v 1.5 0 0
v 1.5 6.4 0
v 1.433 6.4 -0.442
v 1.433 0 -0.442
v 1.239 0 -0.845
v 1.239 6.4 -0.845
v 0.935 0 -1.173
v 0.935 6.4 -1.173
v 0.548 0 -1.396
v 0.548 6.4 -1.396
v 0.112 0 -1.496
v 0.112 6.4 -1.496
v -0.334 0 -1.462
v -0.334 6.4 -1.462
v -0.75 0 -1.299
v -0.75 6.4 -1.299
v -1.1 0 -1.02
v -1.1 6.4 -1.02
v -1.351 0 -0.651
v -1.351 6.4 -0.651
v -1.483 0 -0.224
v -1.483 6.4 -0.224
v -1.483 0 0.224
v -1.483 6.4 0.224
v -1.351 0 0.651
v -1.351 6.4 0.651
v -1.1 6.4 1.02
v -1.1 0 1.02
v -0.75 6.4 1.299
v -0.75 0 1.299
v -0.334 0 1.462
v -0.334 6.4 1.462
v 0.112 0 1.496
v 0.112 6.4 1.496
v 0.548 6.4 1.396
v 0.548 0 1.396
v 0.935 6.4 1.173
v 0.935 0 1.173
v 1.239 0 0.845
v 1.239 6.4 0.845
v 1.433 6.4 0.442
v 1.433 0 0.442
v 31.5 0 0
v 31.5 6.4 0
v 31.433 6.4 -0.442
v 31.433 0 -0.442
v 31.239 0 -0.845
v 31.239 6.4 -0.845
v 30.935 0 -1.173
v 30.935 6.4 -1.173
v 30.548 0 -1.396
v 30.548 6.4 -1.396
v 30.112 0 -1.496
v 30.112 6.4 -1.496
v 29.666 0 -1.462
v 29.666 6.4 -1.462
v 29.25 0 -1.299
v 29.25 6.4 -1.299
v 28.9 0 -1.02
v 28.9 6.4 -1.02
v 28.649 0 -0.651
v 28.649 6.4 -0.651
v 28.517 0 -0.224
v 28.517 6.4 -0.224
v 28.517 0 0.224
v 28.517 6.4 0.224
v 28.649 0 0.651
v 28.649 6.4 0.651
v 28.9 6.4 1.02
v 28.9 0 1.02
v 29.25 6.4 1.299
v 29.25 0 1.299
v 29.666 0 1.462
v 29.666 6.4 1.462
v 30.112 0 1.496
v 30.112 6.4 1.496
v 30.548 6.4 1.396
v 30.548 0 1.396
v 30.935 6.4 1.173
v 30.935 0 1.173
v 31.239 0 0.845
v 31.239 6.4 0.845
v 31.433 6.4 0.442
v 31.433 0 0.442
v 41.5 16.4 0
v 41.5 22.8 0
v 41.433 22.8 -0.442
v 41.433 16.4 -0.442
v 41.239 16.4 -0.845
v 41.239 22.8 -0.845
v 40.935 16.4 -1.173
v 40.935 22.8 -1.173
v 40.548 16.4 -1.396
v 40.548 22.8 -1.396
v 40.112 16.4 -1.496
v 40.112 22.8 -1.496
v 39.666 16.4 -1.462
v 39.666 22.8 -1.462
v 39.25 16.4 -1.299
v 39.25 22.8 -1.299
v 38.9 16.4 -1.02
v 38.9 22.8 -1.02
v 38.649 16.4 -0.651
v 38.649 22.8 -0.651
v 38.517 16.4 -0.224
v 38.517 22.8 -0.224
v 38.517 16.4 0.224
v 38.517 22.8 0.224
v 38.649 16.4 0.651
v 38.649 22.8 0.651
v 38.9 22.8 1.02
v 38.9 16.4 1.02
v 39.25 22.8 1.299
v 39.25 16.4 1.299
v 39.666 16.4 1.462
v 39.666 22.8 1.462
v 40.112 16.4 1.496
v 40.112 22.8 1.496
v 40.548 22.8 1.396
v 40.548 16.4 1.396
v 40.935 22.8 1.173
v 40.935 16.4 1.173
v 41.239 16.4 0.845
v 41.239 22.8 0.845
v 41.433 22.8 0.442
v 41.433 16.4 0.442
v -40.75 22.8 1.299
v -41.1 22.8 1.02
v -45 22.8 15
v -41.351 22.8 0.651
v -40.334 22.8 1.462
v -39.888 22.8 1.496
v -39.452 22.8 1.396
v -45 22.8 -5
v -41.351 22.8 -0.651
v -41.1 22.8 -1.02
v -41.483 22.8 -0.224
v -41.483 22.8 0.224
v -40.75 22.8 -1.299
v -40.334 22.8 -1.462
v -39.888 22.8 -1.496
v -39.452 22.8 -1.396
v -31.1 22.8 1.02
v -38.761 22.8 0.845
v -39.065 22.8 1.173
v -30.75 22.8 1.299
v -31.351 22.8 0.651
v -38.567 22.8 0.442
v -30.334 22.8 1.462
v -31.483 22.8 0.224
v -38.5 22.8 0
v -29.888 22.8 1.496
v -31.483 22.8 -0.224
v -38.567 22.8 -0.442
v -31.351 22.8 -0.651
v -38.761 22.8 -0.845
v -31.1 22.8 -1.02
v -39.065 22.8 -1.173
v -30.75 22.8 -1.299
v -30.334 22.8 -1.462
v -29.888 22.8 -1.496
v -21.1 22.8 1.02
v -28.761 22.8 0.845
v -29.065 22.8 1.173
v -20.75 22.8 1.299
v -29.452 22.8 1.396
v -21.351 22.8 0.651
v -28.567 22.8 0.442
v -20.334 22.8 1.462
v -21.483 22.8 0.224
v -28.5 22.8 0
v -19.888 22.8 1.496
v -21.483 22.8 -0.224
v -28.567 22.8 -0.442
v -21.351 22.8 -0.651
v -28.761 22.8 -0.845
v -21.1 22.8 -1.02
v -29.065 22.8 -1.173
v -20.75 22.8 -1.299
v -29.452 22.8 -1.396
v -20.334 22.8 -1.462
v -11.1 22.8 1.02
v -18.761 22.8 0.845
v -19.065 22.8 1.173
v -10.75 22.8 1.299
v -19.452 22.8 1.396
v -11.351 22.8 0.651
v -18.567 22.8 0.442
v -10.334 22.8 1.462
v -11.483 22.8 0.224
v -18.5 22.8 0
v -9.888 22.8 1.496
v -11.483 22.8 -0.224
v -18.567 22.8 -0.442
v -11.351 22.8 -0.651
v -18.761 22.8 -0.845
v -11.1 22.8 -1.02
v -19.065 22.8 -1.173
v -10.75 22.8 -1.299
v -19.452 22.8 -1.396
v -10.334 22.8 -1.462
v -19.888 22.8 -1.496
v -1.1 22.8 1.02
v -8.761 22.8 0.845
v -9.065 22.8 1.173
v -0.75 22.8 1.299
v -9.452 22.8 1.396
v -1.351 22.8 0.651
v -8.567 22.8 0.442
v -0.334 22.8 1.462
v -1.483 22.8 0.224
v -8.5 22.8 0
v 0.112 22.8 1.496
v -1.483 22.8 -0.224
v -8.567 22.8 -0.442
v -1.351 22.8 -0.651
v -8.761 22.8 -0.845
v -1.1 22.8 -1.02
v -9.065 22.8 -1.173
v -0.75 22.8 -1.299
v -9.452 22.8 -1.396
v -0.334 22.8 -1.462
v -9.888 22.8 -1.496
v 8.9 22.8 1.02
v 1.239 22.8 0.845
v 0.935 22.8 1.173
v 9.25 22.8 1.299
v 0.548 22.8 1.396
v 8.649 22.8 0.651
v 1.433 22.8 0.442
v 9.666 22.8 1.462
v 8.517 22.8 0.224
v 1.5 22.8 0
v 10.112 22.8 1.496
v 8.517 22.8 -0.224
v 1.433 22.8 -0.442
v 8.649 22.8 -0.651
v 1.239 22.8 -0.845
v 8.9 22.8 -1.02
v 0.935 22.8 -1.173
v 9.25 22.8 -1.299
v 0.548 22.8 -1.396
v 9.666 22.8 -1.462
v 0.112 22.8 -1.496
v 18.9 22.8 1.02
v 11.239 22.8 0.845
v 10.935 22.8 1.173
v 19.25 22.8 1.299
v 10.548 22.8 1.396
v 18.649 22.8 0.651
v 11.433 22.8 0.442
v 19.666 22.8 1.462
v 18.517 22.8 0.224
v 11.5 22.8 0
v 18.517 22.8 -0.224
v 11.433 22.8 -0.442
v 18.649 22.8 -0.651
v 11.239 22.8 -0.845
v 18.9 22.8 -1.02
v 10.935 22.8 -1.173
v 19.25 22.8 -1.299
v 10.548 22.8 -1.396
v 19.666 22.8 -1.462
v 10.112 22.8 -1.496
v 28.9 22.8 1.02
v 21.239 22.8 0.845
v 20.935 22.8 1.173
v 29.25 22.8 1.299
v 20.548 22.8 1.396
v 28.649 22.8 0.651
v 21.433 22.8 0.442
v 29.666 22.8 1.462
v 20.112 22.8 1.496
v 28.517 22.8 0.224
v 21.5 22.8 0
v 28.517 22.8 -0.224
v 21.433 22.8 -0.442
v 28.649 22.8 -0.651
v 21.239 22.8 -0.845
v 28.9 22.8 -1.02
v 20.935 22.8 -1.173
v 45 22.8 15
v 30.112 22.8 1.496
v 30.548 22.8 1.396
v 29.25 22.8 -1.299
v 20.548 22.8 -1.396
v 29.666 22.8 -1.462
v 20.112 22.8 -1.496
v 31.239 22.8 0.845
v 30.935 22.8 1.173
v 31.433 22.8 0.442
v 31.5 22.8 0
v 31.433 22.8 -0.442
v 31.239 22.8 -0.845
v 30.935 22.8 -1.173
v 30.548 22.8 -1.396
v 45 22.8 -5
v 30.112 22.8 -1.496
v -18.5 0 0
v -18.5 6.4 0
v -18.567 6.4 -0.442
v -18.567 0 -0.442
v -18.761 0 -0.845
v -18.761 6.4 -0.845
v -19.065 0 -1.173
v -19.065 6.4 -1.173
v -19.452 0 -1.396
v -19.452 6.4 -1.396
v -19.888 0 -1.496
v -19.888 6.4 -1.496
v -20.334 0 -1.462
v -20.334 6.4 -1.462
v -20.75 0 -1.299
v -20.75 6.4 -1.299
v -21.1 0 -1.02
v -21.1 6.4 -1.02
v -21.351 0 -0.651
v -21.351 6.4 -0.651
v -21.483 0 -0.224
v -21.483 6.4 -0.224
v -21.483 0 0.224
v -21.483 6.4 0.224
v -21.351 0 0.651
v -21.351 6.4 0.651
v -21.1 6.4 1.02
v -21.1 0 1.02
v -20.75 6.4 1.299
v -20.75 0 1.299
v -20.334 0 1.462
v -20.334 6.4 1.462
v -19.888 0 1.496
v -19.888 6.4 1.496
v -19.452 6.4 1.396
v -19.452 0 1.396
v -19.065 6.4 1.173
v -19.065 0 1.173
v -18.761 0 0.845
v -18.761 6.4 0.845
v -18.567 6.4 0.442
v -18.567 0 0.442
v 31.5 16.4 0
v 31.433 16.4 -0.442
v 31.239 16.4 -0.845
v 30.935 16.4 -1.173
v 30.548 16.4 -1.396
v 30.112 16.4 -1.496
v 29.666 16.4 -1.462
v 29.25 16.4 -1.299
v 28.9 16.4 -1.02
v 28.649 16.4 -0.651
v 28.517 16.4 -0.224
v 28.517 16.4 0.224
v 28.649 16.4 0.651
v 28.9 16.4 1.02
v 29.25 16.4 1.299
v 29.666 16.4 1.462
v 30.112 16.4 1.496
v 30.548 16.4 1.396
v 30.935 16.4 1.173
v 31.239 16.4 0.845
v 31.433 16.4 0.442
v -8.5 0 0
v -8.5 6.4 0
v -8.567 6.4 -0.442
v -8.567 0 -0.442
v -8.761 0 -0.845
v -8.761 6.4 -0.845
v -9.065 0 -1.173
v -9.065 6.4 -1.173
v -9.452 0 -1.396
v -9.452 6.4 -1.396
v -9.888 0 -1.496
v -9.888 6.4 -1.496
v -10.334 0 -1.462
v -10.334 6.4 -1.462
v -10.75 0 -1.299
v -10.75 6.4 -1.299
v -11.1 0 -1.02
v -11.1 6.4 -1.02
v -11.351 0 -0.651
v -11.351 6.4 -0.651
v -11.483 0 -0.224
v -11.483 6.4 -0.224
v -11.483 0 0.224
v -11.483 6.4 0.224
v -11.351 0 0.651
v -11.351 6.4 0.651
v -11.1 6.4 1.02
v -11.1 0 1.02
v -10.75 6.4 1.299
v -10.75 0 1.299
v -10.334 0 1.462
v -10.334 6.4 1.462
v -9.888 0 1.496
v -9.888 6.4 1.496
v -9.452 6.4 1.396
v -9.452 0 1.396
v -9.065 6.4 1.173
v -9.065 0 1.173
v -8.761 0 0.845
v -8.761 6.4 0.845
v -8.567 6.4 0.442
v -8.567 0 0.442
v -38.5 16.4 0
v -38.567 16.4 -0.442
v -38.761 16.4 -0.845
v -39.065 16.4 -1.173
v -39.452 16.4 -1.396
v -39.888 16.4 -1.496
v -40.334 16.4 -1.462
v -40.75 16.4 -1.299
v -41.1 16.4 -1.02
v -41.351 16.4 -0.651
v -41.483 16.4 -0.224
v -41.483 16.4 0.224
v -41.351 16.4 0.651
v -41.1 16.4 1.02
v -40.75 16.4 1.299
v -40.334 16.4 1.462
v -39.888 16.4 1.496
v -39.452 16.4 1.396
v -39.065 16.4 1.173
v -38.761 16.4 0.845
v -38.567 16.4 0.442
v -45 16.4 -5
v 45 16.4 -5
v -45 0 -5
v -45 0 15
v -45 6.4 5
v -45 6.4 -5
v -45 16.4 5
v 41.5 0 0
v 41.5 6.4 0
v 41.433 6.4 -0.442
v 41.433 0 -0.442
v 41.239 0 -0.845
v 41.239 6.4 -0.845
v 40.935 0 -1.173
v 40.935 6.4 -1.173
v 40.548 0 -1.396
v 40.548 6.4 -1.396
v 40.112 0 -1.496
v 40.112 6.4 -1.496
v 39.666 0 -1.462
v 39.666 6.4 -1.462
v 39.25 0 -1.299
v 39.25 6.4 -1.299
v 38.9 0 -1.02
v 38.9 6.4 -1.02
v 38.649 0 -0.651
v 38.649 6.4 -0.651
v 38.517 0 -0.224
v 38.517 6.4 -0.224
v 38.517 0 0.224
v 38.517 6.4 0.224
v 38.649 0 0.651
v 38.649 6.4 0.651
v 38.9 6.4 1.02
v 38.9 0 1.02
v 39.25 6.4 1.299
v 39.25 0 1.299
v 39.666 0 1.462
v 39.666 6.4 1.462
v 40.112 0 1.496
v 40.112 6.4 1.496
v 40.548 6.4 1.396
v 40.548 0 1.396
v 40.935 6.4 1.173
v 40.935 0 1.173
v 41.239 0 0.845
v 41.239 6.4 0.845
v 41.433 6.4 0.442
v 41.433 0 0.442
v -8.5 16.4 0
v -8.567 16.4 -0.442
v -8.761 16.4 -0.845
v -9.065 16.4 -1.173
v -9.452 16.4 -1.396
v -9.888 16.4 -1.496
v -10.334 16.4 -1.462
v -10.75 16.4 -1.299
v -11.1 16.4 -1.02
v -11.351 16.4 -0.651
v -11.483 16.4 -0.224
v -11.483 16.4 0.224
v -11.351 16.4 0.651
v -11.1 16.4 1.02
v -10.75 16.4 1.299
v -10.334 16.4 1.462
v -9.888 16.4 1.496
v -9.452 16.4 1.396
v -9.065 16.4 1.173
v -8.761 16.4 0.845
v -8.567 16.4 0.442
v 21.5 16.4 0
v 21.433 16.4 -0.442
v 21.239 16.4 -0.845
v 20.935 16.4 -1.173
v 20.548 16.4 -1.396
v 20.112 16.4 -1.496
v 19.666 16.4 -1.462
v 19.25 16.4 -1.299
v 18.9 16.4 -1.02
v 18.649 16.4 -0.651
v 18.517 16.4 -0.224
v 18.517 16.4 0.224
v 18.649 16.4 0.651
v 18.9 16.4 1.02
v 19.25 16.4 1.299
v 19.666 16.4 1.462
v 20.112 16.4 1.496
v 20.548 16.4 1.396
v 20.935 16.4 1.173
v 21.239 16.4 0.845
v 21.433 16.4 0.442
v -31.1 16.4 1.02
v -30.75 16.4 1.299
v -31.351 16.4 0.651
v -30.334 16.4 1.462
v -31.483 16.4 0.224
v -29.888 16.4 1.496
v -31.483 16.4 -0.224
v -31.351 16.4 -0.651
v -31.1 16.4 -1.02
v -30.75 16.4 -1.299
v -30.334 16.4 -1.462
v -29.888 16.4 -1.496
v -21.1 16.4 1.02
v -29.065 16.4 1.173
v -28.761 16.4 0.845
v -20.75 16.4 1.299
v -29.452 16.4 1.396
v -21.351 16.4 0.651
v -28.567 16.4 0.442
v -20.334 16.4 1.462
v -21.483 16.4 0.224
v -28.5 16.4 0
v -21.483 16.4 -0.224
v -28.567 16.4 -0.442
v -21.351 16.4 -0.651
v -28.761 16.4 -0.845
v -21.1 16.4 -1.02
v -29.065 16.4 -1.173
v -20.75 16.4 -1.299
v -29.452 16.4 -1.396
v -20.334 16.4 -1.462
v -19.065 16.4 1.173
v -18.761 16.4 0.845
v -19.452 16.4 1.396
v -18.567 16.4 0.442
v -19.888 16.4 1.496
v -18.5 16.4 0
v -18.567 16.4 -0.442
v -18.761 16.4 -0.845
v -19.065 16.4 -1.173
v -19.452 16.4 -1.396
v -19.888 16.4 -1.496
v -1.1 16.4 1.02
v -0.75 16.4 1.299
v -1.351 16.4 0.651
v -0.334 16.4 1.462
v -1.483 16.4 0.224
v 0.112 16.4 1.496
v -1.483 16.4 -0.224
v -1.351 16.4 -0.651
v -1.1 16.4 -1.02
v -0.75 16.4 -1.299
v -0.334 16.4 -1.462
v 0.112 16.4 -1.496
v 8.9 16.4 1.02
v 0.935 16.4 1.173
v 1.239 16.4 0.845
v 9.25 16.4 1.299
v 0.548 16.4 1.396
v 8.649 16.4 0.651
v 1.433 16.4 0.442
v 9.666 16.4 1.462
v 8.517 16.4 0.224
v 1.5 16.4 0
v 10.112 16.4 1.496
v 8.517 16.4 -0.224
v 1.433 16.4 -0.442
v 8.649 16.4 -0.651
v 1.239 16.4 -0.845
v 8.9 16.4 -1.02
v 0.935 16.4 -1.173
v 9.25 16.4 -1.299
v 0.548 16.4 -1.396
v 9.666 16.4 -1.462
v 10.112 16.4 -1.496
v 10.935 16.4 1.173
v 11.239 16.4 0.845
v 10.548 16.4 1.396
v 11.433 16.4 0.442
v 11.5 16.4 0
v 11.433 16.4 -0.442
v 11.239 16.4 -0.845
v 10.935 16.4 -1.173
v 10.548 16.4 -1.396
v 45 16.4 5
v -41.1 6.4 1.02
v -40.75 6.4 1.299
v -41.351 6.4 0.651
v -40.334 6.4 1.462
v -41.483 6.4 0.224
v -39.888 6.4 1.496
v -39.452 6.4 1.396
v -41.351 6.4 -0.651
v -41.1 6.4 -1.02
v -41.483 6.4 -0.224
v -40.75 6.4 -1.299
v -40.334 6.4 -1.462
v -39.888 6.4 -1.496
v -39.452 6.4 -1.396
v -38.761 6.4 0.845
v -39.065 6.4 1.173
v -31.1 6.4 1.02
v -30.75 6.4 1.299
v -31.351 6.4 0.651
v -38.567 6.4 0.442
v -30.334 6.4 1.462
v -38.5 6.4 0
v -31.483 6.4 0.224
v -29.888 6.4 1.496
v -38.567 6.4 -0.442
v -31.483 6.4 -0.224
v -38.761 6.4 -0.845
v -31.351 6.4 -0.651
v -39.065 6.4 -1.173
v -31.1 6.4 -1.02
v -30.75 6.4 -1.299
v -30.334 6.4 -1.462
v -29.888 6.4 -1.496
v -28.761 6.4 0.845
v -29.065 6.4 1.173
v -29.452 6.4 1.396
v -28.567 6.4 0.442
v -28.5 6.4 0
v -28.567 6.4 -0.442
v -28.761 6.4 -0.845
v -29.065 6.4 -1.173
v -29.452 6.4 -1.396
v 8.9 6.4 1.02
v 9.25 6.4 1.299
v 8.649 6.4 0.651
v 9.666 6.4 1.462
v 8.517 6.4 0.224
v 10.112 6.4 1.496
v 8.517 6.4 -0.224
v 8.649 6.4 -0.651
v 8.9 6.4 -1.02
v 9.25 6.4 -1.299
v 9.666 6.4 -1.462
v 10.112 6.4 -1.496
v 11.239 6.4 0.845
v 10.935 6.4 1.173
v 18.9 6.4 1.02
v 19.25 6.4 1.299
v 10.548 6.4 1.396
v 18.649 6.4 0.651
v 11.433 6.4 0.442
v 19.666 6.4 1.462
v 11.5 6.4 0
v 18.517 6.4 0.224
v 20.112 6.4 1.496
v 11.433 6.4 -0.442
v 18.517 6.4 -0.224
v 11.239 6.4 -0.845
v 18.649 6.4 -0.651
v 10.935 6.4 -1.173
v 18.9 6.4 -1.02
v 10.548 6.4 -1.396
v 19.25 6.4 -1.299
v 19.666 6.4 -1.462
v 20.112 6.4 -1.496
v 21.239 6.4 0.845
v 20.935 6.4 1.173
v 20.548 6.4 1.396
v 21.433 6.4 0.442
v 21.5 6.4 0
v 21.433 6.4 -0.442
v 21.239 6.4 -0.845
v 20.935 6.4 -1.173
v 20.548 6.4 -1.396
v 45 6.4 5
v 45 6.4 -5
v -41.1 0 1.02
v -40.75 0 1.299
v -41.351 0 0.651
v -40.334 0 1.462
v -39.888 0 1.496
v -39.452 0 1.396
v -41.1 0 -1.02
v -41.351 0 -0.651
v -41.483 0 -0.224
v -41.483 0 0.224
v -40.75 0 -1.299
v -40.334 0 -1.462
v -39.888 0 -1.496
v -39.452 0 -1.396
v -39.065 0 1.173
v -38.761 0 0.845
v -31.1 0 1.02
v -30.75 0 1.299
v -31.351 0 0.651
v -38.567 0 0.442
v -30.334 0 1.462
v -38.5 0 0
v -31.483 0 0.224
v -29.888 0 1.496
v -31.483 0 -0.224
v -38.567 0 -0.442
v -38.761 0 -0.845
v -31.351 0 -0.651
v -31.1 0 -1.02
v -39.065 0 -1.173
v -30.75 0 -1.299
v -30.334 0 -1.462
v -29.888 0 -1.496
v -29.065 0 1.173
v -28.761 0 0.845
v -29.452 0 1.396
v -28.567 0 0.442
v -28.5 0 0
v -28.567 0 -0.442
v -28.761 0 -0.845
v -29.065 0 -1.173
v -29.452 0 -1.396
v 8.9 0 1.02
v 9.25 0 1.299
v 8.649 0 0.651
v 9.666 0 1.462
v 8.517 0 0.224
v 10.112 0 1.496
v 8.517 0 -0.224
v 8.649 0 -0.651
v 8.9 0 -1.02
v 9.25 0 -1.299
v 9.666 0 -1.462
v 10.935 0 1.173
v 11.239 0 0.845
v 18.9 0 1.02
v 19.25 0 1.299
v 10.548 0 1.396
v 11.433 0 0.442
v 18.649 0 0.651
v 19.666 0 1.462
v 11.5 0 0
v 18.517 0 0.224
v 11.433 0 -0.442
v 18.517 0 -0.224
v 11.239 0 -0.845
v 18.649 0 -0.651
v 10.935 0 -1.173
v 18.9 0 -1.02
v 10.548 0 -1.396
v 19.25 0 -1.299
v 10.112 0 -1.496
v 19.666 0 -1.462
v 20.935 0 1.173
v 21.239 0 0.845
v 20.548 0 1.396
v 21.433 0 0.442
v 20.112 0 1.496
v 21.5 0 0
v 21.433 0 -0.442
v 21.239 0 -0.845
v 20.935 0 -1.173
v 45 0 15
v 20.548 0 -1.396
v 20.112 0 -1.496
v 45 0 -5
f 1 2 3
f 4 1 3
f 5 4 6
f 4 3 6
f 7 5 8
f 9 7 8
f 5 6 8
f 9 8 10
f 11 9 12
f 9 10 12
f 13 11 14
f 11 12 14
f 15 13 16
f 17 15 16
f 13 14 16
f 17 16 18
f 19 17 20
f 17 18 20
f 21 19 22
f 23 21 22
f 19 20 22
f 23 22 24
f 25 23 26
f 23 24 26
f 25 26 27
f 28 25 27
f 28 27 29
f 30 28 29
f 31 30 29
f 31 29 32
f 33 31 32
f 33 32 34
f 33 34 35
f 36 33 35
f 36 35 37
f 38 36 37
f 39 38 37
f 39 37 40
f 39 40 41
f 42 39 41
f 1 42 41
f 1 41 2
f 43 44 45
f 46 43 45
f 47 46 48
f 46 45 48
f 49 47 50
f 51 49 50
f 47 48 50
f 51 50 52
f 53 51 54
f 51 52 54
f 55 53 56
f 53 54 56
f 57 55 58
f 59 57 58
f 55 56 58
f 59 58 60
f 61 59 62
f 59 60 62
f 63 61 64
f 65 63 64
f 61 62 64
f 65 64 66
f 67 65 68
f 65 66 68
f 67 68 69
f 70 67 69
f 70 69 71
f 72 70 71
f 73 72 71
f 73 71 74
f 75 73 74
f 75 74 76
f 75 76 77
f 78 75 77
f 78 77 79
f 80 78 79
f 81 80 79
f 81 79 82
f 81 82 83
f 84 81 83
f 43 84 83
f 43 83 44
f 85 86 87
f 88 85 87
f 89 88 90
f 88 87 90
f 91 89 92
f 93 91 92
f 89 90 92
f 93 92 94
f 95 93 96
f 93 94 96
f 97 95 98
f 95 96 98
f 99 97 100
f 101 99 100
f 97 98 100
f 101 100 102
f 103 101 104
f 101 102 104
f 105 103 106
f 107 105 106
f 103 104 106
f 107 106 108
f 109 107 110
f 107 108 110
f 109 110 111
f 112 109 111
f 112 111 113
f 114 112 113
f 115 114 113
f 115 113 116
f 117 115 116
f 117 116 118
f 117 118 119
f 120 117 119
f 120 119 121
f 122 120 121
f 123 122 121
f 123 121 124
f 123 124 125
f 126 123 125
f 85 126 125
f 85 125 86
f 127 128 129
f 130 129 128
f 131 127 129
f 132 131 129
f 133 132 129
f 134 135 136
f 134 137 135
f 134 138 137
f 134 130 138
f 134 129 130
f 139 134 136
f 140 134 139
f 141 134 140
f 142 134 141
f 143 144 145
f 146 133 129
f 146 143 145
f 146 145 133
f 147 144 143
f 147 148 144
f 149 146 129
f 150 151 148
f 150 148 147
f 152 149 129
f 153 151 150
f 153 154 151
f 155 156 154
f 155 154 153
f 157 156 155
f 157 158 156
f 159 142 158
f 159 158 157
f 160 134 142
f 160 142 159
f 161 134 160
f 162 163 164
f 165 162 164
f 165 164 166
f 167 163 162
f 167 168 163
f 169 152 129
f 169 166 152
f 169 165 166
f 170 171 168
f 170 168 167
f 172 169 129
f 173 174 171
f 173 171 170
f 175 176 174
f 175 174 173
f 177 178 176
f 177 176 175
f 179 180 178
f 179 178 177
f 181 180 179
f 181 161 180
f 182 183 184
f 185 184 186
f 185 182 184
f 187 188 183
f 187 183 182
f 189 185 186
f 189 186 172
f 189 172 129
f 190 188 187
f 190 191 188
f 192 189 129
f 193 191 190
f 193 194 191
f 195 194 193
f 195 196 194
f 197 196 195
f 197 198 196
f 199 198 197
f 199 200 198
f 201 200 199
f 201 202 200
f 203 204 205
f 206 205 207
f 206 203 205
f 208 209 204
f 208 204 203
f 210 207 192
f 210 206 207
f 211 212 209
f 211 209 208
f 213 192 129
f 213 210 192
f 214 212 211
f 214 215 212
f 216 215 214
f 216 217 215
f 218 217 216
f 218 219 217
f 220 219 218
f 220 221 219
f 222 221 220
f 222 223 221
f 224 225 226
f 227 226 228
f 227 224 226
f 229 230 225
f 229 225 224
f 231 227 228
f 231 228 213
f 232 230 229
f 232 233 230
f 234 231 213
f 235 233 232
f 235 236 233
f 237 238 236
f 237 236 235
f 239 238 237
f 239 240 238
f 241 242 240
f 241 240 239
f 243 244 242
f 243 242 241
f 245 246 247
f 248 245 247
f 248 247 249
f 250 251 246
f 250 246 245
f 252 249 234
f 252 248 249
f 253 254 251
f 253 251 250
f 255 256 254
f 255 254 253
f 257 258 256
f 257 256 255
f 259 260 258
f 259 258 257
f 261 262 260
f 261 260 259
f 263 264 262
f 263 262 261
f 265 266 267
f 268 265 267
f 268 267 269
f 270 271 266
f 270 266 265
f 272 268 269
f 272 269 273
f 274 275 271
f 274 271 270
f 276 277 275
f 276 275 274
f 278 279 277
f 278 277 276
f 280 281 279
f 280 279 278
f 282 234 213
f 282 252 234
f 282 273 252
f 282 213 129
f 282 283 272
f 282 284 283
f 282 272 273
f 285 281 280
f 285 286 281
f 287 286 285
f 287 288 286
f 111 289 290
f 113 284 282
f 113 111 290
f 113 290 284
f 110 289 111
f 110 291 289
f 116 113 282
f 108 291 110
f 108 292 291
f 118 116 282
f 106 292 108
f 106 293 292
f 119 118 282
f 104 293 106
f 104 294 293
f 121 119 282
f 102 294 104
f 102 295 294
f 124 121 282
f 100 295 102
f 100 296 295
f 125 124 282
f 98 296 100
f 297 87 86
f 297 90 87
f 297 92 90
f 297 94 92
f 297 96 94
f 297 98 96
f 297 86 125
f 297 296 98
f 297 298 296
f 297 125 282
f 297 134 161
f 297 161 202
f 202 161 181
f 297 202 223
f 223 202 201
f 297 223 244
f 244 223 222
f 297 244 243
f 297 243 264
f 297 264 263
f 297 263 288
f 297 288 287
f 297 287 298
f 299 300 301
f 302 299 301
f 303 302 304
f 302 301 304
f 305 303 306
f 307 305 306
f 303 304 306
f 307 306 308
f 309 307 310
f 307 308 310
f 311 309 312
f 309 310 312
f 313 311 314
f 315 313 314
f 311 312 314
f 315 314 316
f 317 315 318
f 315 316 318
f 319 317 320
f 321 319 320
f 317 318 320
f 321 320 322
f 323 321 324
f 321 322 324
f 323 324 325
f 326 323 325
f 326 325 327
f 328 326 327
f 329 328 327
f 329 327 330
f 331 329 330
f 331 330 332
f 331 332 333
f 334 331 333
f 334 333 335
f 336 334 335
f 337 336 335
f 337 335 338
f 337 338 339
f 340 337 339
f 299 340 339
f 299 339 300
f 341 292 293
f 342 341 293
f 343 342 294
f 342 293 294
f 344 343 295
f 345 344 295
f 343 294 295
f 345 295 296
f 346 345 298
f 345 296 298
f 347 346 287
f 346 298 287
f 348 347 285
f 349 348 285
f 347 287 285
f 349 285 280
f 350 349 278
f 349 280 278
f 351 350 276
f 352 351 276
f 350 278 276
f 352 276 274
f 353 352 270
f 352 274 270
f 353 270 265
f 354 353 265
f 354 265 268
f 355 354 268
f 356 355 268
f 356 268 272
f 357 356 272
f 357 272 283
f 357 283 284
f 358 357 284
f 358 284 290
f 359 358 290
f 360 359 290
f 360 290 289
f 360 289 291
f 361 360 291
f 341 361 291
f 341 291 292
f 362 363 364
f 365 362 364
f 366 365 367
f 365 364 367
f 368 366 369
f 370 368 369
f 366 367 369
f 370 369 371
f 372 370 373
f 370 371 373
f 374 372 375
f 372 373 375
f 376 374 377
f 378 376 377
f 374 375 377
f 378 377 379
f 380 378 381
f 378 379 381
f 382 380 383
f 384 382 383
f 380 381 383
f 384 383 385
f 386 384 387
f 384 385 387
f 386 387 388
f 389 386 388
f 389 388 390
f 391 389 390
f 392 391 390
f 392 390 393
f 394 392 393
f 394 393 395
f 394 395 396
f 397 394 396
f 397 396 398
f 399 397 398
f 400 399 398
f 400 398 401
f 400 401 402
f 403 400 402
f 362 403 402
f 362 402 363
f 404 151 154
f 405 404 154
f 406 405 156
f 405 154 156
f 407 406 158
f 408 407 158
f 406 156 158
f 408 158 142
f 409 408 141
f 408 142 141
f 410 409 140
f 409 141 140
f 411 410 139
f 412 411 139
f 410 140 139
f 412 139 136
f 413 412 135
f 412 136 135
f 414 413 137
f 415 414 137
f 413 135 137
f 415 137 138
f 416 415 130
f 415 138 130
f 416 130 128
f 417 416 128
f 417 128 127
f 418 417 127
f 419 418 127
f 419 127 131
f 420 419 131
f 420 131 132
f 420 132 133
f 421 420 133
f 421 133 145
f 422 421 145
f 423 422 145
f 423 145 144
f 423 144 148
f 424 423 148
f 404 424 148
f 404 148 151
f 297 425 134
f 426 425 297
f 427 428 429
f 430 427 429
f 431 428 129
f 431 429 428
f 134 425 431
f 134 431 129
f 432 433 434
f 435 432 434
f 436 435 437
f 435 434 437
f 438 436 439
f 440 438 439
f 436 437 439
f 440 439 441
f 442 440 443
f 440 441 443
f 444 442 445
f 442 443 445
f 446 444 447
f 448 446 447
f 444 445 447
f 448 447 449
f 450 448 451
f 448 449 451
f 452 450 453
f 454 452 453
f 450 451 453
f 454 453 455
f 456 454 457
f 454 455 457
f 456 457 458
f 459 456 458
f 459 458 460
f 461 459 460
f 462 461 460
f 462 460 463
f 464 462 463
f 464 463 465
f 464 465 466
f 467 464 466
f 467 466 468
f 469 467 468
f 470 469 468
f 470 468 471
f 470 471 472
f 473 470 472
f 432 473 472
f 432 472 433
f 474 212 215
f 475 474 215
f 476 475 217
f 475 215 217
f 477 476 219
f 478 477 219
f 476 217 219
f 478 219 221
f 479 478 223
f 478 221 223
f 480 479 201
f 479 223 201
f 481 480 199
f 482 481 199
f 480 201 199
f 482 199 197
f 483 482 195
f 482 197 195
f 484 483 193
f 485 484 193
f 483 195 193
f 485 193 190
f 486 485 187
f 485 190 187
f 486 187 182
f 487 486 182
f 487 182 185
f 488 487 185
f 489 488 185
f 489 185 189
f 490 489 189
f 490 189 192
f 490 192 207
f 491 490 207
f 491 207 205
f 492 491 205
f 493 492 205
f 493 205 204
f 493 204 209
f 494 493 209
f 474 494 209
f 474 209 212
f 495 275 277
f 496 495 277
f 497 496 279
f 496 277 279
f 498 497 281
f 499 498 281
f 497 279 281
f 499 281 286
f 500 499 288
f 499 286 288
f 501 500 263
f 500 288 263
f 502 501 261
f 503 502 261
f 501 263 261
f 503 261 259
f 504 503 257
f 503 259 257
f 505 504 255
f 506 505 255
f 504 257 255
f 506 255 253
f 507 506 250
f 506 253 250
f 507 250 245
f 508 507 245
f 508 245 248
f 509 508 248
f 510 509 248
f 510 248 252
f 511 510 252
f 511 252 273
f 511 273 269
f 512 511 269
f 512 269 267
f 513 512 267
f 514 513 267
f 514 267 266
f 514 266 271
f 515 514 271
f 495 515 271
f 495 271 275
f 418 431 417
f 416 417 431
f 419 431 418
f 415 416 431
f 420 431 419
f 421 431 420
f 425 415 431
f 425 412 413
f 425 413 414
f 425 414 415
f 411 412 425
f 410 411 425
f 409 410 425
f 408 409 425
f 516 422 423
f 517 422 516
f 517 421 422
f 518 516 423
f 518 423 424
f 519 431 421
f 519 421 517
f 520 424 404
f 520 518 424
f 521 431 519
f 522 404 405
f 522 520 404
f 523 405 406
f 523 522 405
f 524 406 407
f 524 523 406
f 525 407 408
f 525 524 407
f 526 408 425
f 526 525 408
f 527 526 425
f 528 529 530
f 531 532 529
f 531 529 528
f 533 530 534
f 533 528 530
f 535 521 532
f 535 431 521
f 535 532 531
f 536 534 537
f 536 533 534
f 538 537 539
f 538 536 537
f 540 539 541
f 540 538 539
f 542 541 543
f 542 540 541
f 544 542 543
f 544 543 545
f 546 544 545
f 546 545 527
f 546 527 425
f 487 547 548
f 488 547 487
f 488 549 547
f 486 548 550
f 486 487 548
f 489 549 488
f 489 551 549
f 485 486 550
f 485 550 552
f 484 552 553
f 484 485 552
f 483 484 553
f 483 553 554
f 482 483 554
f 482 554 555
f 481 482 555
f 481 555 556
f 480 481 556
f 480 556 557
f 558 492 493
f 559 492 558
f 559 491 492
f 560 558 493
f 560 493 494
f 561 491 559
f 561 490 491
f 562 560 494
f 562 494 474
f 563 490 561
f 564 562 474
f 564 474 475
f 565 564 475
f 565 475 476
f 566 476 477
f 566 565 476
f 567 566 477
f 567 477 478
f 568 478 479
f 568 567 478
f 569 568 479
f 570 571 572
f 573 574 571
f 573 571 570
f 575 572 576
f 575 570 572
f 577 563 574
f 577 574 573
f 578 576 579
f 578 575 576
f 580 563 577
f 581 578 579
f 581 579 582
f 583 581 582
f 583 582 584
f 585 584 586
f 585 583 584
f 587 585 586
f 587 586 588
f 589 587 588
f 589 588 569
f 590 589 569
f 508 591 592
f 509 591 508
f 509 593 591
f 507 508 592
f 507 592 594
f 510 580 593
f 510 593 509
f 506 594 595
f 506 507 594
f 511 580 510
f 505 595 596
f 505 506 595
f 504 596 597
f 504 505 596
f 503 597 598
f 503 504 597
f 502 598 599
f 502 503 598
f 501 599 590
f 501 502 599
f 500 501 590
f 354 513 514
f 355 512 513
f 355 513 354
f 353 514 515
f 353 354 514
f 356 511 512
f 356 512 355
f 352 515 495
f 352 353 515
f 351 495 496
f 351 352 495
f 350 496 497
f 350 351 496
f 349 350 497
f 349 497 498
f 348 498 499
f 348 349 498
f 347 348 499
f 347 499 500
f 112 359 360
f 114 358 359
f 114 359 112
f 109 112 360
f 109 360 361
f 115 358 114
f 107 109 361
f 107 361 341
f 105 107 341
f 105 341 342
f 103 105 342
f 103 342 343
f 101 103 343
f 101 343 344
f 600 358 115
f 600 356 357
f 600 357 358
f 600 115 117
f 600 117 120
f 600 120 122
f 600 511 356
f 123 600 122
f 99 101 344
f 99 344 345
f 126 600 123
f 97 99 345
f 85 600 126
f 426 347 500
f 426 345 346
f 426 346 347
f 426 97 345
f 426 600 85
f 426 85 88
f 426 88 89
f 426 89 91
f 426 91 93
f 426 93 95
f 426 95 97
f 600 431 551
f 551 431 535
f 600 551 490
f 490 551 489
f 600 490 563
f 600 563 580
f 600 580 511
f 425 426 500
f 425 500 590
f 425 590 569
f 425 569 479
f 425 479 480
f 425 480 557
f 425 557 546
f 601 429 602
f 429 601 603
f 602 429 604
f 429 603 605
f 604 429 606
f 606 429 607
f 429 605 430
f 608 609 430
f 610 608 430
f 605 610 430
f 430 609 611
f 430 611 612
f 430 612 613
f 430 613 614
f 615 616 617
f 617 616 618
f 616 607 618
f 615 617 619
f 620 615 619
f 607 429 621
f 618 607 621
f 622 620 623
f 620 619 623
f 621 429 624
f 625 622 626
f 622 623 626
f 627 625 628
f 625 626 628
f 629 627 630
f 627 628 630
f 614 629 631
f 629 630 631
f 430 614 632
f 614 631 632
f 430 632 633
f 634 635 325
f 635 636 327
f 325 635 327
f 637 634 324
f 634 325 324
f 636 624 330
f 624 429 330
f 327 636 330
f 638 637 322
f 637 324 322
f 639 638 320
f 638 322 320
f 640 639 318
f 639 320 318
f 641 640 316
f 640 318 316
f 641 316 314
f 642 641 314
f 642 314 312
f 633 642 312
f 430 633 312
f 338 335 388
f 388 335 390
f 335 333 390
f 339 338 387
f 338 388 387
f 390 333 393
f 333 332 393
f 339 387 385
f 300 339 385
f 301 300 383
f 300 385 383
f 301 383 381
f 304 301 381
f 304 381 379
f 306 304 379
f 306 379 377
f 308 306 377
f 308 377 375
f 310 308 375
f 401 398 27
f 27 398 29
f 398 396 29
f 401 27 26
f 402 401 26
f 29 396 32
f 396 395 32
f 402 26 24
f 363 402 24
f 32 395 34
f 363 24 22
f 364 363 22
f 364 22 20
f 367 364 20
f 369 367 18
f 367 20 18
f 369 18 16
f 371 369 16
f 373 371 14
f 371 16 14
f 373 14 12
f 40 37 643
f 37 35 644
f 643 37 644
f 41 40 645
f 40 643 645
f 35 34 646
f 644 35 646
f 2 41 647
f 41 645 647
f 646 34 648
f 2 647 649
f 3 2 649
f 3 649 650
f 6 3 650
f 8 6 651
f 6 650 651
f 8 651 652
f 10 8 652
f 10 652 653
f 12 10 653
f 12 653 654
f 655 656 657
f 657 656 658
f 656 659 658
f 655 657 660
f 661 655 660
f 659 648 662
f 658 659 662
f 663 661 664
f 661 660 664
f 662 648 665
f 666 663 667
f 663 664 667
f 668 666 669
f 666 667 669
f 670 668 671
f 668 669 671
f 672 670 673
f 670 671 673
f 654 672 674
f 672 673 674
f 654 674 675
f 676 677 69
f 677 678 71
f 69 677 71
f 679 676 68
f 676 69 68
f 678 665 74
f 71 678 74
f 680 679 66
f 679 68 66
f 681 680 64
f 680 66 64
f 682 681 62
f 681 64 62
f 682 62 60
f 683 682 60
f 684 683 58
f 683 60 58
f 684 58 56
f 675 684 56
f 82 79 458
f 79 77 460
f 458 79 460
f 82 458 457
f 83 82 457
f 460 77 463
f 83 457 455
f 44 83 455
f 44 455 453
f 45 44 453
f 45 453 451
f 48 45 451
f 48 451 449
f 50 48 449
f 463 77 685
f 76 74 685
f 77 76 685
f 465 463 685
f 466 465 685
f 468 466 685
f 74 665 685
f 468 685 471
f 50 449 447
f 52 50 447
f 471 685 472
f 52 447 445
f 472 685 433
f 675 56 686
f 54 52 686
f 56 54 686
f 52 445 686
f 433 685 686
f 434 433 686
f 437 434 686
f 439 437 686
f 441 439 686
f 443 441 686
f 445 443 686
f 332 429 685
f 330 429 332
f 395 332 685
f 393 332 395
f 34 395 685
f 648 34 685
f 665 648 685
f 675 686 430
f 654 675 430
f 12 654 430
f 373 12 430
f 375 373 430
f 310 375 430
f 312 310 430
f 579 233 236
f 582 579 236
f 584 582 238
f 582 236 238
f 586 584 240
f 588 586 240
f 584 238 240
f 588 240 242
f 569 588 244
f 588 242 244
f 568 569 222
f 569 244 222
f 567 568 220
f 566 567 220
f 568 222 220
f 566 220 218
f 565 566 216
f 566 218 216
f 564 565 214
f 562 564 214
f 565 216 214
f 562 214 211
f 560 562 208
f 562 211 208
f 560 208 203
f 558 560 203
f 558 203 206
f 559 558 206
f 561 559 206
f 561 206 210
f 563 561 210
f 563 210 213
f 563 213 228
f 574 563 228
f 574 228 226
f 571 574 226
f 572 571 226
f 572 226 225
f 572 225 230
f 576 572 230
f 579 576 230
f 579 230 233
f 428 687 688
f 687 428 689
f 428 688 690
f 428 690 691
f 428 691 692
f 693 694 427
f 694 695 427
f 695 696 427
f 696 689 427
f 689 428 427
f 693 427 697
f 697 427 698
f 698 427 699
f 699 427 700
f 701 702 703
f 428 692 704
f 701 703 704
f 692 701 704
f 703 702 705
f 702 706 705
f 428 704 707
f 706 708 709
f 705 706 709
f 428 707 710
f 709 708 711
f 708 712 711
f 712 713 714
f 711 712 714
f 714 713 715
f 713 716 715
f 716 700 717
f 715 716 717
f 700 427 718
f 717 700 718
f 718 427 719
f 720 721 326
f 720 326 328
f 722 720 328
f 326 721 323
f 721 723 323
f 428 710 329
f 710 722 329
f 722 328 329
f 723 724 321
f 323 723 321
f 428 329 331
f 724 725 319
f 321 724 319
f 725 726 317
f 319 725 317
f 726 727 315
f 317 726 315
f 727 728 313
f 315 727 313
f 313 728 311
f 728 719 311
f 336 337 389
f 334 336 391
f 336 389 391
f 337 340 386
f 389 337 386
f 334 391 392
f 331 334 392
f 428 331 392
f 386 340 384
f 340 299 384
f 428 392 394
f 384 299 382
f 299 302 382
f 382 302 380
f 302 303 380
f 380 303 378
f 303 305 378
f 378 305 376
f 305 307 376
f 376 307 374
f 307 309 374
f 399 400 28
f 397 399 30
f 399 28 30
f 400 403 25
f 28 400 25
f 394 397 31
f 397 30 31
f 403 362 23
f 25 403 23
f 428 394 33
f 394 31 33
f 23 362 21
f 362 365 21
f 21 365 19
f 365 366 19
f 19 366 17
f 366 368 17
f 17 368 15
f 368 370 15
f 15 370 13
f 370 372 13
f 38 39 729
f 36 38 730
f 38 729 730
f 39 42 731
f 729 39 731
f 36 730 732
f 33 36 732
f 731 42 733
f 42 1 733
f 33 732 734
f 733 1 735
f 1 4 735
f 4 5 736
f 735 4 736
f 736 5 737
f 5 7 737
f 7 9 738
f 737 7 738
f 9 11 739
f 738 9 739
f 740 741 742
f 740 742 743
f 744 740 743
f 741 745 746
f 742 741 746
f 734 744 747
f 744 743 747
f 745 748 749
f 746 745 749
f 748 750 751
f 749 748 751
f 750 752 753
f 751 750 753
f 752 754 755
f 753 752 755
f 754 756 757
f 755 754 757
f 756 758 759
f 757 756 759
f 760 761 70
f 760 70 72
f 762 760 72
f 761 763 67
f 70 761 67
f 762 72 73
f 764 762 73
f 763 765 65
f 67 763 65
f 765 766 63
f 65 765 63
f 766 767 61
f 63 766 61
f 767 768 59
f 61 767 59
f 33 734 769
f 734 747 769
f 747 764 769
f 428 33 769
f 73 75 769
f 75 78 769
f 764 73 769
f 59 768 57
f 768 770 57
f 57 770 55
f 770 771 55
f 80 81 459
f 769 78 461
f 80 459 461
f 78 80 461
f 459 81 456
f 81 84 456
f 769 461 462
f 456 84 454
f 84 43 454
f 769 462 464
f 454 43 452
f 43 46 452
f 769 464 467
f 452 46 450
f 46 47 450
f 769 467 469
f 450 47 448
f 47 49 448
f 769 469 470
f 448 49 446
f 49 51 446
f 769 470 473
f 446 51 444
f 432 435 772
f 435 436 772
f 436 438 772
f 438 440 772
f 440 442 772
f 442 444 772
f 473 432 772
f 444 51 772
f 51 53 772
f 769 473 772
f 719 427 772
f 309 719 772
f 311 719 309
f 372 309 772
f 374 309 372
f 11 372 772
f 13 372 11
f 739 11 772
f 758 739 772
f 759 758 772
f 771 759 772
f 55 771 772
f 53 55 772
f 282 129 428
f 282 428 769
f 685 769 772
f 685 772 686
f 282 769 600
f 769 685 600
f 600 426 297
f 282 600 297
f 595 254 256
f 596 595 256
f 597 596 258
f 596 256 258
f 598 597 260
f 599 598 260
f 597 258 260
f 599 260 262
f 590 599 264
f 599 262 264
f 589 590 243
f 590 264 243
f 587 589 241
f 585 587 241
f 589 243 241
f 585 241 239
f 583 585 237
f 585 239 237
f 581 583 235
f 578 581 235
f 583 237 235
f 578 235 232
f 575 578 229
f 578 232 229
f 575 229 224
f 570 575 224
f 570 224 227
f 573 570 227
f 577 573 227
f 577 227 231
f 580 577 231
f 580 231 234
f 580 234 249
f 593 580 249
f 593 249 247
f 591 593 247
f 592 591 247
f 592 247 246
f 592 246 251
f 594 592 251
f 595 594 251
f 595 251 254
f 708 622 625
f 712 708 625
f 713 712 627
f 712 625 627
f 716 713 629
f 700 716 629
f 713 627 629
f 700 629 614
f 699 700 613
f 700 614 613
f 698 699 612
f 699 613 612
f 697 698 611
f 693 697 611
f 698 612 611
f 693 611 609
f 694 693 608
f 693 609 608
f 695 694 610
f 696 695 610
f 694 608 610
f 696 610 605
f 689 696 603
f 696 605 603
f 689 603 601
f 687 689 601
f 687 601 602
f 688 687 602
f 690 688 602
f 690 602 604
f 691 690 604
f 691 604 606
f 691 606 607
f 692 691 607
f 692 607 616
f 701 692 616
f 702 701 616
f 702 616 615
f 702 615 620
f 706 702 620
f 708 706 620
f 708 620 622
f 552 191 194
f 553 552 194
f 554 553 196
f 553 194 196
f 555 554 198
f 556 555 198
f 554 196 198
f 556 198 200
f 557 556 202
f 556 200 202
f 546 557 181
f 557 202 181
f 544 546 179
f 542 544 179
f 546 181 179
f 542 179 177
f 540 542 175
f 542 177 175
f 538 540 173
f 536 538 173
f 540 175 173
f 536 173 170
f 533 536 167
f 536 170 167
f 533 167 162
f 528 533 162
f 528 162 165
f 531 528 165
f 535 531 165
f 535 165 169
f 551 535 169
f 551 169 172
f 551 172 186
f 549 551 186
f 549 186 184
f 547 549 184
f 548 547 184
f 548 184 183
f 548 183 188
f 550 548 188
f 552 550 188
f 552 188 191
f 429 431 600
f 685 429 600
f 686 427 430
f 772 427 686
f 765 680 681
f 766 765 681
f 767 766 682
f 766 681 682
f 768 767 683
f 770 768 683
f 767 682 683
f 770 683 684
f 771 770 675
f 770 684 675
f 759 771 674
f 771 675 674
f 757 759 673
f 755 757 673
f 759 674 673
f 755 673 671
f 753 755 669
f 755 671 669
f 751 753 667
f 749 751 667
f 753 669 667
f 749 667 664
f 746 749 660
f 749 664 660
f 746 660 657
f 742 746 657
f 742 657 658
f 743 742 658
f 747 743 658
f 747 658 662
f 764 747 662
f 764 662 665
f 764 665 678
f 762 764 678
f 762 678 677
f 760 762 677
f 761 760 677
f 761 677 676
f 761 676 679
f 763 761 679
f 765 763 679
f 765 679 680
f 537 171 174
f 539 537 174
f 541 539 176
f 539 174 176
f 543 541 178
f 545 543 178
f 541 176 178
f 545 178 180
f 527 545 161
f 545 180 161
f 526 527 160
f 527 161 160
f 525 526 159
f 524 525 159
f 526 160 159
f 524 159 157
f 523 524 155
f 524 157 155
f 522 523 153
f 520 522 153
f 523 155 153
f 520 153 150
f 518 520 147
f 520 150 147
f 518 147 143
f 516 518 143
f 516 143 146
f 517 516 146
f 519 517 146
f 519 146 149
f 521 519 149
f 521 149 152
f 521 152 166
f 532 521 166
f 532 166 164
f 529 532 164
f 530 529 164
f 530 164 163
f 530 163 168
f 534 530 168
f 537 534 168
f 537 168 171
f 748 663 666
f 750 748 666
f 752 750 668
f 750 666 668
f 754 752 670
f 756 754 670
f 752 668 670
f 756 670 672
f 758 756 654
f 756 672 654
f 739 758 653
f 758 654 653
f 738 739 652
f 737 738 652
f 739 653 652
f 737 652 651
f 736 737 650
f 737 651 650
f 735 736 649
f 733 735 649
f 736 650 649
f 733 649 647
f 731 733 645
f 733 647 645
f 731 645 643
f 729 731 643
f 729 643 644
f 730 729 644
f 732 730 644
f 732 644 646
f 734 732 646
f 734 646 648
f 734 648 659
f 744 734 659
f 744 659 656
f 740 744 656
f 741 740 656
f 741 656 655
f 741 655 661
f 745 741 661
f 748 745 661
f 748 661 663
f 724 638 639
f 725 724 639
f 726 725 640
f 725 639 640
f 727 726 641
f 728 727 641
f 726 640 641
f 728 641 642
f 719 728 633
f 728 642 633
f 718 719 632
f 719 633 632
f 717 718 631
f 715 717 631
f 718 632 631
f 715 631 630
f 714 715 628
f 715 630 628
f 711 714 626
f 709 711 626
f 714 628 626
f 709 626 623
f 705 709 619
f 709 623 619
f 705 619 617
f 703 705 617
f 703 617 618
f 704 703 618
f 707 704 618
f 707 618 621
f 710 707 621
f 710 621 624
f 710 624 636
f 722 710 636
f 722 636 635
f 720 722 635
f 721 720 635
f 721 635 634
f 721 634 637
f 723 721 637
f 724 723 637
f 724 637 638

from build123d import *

# Parameters (mm, degrees)
SKETCH1_W           = 90
SKETCH1_H           = 10
BOSS_EXTRUDE1_DEPTH = 22.8
SKETCH2_R           = 1.5
CUT_EXTRUDE1_DEPTH  = 23.8
LPATTERN1_COUNT     = 9
LPATTERN1_PITCH     = 10
SKETCH3_W           = 10
SKETCH3_H           = 10
CUT_EXTRUDE2_DEPTH  = 91
SKETCH4_W           = 90
SKETCH4_H           = 22.8
BOSS_EXTRUDE2_DEPTH = 10


with BuildPart() as part:
    # Sketch1 → Boss-Extrude1 (new body)
    with BuildSketch(Plane(origin=(0, 0, 0), x_dir=(1, 0, 0), z_dir=(0, 1, 0))):
        Rectangle(SKETCH1_W, SKETCH1_H)
    extrude(amount=BOSS_EXTRUDE1_DEPTH)

    # Sketch2 → Cut-Extrude1 (cut, through all)
    with BuildSketch(Plane(origin=(0, 22.8, 0), x_dir=(1, 0, 0), z_dir=(0, 1, 0))):
        with Locations((-40, 0)):
            Circle(SKETCH2_R)
    cut_extrude1 = extrude(amount=-CUT_EXTRUDE1_DEPTH, mode=Mode.SUBTRACT)

    # LPattern1: Cut-Extrude1 ×9
    with Locations(*[(i * LPATTERN1_PITCH, 0, 0) for i in range(1, LPATTERN1_COUNT)]):
        add(cut_extrude1, mode=Mode.SUBTRACT)

    # Sketch3 → Cut-Extrude2 (cut, through all)
    with BuildSketch(Plane(origin=(45, 0, 0), x_dir=(0, 0, -1), z_dir=(1, 0, 0))):
        with Locations((0, 11.4)):
            Rectangle(SKETCH3_W, SKETCH3_H)
    extrude(amount=-CUT_EXTRUDE2_DEPTH, mode=Mode.SUBTRACT)

    # Sketch4 → Boss-Extrude2 (add)
    with BuildSketch(Plane.XY.offset(5)):
        with Locations((0, 11.4)):
            Rectangle(SKETCH4_W, SKETCH4_H)
    extrude(amount=BOSS_EXTRUDE2_DEPTH)


solid = part.part
